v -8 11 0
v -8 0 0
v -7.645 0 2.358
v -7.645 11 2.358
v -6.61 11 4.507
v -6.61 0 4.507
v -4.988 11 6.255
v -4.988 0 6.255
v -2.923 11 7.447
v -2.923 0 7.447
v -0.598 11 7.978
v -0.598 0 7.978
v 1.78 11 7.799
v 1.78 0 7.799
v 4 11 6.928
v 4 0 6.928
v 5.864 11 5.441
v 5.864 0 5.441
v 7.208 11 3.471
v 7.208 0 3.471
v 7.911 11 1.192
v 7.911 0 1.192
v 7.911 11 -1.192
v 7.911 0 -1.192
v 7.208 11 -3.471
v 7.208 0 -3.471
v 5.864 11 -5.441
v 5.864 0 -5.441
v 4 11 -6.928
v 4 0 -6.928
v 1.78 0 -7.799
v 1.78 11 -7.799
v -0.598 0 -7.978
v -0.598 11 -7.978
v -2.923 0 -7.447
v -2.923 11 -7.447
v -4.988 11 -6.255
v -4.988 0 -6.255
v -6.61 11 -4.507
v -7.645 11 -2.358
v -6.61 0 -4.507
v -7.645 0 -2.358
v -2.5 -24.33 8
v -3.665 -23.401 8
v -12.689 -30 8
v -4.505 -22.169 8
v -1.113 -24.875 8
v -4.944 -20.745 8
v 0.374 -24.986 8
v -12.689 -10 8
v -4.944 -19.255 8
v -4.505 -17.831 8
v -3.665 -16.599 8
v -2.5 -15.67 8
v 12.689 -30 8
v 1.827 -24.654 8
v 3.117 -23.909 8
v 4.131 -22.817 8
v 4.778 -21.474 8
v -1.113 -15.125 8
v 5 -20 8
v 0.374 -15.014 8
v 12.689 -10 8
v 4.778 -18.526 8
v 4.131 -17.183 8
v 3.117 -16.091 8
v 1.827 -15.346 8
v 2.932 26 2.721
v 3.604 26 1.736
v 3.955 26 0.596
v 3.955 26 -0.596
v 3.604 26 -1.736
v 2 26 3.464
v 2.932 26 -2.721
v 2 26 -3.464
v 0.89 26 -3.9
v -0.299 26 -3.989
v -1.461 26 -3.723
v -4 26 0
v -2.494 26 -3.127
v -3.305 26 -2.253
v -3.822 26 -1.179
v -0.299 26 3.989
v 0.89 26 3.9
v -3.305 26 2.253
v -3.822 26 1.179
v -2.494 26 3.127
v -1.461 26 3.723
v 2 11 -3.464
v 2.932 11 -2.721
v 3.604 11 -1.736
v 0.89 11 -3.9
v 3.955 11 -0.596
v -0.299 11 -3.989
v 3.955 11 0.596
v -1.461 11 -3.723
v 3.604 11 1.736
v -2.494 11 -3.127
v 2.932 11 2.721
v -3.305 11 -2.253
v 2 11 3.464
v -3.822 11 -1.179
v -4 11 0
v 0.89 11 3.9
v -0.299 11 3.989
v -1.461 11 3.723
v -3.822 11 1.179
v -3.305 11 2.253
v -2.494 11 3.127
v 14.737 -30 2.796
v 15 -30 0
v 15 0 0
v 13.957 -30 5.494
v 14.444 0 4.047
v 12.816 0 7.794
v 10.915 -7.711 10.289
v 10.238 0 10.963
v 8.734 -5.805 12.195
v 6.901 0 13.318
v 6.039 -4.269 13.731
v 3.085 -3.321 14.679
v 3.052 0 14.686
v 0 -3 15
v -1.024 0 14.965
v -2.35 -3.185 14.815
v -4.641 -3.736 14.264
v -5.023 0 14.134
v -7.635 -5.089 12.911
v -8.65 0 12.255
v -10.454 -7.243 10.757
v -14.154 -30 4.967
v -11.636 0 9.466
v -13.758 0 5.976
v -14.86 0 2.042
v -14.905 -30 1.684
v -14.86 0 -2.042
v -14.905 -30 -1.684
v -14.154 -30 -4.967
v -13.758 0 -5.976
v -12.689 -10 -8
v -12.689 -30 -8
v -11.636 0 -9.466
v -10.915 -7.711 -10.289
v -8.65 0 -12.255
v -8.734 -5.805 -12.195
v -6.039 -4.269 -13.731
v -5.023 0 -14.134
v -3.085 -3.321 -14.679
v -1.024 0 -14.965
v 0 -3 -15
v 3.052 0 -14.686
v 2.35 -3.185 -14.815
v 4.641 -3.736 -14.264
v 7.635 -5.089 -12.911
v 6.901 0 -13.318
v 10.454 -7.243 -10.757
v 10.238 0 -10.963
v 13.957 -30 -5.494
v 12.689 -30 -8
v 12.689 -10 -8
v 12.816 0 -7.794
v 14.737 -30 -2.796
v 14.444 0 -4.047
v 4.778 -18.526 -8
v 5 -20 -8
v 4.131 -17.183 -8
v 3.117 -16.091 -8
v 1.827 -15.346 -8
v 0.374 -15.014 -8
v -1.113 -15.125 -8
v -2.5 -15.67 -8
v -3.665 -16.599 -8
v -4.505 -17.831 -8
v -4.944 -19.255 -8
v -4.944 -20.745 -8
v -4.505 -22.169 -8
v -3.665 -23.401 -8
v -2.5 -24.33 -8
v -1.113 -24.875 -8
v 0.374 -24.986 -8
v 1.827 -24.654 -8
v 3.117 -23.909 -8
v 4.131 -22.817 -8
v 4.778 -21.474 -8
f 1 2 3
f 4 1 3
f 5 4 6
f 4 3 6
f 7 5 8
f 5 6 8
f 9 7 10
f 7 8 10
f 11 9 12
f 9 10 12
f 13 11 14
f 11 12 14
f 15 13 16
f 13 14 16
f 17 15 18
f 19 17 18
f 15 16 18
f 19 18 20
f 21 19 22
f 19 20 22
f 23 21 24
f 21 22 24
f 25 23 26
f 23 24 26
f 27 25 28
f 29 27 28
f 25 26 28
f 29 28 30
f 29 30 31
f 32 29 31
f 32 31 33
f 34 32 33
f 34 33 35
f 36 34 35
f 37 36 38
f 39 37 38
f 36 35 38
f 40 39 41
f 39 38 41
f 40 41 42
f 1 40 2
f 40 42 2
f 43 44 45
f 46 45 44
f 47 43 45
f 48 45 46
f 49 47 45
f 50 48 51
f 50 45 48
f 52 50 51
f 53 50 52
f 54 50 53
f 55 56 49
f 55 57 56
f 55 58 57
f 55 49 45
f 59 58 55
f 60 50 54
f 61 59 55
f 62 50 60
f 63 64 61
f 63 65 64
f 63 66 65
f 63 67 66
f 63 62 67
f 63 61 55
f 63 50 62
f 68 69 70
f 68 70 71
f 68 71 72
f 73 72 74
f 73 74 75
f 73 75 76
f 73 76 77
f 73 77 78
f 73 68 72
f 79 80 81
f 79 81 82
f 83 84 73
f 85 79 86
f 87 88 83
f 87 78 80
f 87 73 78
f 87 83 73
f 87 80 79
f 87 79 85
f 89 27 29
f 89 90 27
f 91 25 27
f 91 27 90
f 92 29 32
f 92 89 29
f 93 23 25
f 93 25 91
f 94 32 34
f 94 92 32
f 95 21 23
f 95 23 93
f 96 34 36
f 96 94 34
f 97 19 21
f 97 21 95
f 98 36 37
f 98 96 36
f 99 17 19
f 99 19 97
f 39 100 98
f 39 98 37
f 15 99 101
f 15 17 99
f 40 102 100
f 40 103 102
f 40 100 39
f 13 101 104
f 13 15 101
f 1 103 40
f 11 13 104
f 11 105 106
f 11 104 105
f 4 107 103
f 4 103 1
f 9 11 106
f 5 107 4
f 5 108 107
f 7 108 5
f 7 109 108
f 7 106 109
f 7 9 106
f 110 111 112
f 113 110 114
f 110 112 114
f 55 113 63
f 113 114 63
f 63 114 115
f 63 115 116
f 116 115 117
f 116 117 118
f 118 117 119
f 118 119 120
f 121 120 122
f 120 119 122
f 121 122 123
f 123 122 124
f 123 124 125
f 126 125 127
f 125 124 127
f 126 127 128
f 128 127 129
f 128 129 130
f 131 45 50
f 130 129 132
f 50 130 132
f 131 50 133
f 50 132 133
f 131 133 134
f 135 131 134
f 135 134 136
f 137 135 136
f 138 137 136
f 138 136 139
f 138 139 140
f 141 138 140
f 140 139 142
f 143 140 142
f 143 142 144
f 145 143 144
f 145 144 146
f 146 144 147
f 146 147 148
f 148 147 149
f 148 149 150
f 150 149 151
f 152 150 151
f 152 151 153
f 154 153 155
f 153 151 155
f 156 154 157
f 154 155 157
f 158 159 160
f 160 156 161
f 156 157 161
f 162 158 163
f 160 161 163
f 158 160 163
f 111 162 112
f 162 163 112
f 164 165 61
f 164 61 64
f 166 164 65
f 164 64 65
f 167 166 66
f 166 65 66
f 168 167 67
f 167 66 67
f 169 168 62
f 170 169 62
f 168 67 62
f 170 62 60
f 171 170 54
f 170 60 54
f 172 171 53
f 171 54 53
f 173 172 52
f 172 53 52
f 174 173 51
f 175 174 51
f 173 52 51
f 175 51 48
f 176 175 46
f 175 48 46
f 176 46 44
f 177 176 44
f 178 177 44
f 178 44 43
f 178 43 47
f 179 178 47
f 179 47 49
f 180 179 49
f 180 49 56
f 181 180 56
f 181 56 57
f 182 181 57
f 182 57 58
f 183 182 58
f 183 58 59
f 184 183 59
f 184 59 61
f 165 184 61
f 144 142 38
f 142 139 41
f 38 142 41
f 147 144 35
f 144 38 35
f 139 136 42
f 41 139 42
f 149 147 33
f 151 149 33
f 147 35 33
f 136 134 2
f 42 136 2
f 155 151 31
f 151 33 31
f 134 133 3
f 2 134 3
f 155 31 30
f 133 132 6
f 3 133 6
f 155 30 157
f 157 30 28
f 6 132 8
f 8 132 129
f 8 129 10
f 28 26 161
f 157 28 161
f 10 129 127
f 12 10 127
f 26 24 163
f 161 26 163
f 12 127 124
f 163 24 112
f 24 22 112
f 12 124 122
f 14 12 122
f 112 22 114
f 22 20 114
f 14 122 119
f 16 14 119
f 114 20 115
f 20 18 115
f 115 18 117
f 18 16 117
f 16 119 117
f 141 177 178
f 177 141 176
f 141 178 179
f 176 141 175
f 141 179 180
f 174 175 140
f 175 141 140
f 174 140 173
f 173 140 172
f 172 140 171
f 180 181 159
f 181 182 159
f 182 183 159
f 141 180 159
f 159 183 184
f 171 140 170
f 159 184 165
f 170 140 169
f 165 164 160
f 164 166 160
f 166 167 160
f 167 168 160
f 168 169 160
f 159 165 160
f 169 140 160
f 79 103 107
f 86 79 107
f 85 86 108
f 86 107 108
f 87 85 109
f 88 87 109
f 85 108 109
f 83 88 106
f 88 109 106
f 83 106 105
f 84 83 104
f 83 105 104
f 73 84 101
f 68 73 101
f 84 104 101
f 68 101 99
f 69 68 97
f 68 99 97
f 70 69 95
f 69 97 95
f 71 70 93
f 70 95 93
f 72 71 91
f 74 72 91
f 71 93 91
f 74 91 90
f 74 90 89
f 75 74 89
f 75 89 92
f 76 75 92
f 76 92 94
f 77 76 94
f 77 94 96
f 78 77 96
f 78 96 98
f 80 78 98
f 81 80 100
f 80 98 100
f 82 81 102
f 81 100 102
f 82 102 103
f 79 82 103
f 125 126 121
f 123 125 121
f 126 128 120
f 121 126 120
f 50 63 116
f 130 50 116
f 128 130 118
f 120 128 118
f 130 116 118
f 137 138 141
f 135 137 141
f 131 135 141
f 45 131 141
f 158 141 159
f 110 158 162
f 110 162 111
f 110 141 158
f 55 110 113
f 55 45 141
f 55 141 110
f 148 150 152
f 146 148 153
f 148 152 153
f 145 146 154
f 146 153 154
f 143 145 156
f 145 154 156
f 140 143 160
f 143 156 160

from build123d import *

# Parameters (mm, degrees)
F0_R      = 15
F1_DEPTH  = 30
F3_W      = 30
F3_H      = 20
F4_DEPTH  = 7
F6_W      = 30
F6_H      = 20
F7_DEPTH  = 7
F10_DEPTH = 30
F11_R     = 8
F12_DEPTH = 11
F13_R     = 4
F14_DEPTH = 15
F15_R     = 5
F16_DEPTH = 23.001


with BuildPart() as f1:
    # F0 (on Front) → F1 (new body)
    with BuildSketch(Plane.XZ):
        Circle(F0_R)
    extrude(amount=F1_DEPTH)

    # F3 (on offset) → F4 (cut)
    with BuildSketch(Plane.XY.offset(15)):
        with Locations((0, -20)):
            Rectangle(F3_W, F3_H)
    extrude(amount=-F4_DEPTH, mode=Mode.SUBTRACT)

    # F6 (on offset) → F7 (cut)
    with BuildSketch(Plane.XY.offset(-15)):
        with Locations((0, -20)):
            Rectangle(F6_W, F6_H)
    extrude(amount=F7_DEPTH, mode=Mode.SUBTRACT)

    # F9 (on offset) → F10 (cut)
    with BuildSketch(Plane.YZ.offset(15)):
        Polygon((-3, 15), (-10, 15), (-10, 8), align=None)
        Polygon((-10, -15), (-3, -15), (-10, -8), align=None)
    extrude(amount=-F10_DEPTH, mode=Mode.SUBTRACT)

    # F11 (on face) → F12 (join)
    with BuildSketch(Plane(origin=(0, 0, 0), x_dir=(-1, 0, 0), z_dir=(0, 1, 0))):
        Circle(F11_R)
    extrude(amount=F12_DEPTH)

    # F13 (on face) → F14 (join)
    with BuildSketch(Plane(origin=(0, 11, 0), x_dir=(-1, 0, 0), z_dir=(0, 1, 0))):
        Circle(F13_R)
    extrude(amount=F14_DEPTH)

    # F15 (on face) → F16 (cut, through all)
    with BuildSketch(Plane.XY.offset(8)):
        with Locations((0, -20)):
            Circle(F15_R)
    extrude(amount=-F16_DEPTH, mode=Mode.SUBTRACT)


solid = f1.part
